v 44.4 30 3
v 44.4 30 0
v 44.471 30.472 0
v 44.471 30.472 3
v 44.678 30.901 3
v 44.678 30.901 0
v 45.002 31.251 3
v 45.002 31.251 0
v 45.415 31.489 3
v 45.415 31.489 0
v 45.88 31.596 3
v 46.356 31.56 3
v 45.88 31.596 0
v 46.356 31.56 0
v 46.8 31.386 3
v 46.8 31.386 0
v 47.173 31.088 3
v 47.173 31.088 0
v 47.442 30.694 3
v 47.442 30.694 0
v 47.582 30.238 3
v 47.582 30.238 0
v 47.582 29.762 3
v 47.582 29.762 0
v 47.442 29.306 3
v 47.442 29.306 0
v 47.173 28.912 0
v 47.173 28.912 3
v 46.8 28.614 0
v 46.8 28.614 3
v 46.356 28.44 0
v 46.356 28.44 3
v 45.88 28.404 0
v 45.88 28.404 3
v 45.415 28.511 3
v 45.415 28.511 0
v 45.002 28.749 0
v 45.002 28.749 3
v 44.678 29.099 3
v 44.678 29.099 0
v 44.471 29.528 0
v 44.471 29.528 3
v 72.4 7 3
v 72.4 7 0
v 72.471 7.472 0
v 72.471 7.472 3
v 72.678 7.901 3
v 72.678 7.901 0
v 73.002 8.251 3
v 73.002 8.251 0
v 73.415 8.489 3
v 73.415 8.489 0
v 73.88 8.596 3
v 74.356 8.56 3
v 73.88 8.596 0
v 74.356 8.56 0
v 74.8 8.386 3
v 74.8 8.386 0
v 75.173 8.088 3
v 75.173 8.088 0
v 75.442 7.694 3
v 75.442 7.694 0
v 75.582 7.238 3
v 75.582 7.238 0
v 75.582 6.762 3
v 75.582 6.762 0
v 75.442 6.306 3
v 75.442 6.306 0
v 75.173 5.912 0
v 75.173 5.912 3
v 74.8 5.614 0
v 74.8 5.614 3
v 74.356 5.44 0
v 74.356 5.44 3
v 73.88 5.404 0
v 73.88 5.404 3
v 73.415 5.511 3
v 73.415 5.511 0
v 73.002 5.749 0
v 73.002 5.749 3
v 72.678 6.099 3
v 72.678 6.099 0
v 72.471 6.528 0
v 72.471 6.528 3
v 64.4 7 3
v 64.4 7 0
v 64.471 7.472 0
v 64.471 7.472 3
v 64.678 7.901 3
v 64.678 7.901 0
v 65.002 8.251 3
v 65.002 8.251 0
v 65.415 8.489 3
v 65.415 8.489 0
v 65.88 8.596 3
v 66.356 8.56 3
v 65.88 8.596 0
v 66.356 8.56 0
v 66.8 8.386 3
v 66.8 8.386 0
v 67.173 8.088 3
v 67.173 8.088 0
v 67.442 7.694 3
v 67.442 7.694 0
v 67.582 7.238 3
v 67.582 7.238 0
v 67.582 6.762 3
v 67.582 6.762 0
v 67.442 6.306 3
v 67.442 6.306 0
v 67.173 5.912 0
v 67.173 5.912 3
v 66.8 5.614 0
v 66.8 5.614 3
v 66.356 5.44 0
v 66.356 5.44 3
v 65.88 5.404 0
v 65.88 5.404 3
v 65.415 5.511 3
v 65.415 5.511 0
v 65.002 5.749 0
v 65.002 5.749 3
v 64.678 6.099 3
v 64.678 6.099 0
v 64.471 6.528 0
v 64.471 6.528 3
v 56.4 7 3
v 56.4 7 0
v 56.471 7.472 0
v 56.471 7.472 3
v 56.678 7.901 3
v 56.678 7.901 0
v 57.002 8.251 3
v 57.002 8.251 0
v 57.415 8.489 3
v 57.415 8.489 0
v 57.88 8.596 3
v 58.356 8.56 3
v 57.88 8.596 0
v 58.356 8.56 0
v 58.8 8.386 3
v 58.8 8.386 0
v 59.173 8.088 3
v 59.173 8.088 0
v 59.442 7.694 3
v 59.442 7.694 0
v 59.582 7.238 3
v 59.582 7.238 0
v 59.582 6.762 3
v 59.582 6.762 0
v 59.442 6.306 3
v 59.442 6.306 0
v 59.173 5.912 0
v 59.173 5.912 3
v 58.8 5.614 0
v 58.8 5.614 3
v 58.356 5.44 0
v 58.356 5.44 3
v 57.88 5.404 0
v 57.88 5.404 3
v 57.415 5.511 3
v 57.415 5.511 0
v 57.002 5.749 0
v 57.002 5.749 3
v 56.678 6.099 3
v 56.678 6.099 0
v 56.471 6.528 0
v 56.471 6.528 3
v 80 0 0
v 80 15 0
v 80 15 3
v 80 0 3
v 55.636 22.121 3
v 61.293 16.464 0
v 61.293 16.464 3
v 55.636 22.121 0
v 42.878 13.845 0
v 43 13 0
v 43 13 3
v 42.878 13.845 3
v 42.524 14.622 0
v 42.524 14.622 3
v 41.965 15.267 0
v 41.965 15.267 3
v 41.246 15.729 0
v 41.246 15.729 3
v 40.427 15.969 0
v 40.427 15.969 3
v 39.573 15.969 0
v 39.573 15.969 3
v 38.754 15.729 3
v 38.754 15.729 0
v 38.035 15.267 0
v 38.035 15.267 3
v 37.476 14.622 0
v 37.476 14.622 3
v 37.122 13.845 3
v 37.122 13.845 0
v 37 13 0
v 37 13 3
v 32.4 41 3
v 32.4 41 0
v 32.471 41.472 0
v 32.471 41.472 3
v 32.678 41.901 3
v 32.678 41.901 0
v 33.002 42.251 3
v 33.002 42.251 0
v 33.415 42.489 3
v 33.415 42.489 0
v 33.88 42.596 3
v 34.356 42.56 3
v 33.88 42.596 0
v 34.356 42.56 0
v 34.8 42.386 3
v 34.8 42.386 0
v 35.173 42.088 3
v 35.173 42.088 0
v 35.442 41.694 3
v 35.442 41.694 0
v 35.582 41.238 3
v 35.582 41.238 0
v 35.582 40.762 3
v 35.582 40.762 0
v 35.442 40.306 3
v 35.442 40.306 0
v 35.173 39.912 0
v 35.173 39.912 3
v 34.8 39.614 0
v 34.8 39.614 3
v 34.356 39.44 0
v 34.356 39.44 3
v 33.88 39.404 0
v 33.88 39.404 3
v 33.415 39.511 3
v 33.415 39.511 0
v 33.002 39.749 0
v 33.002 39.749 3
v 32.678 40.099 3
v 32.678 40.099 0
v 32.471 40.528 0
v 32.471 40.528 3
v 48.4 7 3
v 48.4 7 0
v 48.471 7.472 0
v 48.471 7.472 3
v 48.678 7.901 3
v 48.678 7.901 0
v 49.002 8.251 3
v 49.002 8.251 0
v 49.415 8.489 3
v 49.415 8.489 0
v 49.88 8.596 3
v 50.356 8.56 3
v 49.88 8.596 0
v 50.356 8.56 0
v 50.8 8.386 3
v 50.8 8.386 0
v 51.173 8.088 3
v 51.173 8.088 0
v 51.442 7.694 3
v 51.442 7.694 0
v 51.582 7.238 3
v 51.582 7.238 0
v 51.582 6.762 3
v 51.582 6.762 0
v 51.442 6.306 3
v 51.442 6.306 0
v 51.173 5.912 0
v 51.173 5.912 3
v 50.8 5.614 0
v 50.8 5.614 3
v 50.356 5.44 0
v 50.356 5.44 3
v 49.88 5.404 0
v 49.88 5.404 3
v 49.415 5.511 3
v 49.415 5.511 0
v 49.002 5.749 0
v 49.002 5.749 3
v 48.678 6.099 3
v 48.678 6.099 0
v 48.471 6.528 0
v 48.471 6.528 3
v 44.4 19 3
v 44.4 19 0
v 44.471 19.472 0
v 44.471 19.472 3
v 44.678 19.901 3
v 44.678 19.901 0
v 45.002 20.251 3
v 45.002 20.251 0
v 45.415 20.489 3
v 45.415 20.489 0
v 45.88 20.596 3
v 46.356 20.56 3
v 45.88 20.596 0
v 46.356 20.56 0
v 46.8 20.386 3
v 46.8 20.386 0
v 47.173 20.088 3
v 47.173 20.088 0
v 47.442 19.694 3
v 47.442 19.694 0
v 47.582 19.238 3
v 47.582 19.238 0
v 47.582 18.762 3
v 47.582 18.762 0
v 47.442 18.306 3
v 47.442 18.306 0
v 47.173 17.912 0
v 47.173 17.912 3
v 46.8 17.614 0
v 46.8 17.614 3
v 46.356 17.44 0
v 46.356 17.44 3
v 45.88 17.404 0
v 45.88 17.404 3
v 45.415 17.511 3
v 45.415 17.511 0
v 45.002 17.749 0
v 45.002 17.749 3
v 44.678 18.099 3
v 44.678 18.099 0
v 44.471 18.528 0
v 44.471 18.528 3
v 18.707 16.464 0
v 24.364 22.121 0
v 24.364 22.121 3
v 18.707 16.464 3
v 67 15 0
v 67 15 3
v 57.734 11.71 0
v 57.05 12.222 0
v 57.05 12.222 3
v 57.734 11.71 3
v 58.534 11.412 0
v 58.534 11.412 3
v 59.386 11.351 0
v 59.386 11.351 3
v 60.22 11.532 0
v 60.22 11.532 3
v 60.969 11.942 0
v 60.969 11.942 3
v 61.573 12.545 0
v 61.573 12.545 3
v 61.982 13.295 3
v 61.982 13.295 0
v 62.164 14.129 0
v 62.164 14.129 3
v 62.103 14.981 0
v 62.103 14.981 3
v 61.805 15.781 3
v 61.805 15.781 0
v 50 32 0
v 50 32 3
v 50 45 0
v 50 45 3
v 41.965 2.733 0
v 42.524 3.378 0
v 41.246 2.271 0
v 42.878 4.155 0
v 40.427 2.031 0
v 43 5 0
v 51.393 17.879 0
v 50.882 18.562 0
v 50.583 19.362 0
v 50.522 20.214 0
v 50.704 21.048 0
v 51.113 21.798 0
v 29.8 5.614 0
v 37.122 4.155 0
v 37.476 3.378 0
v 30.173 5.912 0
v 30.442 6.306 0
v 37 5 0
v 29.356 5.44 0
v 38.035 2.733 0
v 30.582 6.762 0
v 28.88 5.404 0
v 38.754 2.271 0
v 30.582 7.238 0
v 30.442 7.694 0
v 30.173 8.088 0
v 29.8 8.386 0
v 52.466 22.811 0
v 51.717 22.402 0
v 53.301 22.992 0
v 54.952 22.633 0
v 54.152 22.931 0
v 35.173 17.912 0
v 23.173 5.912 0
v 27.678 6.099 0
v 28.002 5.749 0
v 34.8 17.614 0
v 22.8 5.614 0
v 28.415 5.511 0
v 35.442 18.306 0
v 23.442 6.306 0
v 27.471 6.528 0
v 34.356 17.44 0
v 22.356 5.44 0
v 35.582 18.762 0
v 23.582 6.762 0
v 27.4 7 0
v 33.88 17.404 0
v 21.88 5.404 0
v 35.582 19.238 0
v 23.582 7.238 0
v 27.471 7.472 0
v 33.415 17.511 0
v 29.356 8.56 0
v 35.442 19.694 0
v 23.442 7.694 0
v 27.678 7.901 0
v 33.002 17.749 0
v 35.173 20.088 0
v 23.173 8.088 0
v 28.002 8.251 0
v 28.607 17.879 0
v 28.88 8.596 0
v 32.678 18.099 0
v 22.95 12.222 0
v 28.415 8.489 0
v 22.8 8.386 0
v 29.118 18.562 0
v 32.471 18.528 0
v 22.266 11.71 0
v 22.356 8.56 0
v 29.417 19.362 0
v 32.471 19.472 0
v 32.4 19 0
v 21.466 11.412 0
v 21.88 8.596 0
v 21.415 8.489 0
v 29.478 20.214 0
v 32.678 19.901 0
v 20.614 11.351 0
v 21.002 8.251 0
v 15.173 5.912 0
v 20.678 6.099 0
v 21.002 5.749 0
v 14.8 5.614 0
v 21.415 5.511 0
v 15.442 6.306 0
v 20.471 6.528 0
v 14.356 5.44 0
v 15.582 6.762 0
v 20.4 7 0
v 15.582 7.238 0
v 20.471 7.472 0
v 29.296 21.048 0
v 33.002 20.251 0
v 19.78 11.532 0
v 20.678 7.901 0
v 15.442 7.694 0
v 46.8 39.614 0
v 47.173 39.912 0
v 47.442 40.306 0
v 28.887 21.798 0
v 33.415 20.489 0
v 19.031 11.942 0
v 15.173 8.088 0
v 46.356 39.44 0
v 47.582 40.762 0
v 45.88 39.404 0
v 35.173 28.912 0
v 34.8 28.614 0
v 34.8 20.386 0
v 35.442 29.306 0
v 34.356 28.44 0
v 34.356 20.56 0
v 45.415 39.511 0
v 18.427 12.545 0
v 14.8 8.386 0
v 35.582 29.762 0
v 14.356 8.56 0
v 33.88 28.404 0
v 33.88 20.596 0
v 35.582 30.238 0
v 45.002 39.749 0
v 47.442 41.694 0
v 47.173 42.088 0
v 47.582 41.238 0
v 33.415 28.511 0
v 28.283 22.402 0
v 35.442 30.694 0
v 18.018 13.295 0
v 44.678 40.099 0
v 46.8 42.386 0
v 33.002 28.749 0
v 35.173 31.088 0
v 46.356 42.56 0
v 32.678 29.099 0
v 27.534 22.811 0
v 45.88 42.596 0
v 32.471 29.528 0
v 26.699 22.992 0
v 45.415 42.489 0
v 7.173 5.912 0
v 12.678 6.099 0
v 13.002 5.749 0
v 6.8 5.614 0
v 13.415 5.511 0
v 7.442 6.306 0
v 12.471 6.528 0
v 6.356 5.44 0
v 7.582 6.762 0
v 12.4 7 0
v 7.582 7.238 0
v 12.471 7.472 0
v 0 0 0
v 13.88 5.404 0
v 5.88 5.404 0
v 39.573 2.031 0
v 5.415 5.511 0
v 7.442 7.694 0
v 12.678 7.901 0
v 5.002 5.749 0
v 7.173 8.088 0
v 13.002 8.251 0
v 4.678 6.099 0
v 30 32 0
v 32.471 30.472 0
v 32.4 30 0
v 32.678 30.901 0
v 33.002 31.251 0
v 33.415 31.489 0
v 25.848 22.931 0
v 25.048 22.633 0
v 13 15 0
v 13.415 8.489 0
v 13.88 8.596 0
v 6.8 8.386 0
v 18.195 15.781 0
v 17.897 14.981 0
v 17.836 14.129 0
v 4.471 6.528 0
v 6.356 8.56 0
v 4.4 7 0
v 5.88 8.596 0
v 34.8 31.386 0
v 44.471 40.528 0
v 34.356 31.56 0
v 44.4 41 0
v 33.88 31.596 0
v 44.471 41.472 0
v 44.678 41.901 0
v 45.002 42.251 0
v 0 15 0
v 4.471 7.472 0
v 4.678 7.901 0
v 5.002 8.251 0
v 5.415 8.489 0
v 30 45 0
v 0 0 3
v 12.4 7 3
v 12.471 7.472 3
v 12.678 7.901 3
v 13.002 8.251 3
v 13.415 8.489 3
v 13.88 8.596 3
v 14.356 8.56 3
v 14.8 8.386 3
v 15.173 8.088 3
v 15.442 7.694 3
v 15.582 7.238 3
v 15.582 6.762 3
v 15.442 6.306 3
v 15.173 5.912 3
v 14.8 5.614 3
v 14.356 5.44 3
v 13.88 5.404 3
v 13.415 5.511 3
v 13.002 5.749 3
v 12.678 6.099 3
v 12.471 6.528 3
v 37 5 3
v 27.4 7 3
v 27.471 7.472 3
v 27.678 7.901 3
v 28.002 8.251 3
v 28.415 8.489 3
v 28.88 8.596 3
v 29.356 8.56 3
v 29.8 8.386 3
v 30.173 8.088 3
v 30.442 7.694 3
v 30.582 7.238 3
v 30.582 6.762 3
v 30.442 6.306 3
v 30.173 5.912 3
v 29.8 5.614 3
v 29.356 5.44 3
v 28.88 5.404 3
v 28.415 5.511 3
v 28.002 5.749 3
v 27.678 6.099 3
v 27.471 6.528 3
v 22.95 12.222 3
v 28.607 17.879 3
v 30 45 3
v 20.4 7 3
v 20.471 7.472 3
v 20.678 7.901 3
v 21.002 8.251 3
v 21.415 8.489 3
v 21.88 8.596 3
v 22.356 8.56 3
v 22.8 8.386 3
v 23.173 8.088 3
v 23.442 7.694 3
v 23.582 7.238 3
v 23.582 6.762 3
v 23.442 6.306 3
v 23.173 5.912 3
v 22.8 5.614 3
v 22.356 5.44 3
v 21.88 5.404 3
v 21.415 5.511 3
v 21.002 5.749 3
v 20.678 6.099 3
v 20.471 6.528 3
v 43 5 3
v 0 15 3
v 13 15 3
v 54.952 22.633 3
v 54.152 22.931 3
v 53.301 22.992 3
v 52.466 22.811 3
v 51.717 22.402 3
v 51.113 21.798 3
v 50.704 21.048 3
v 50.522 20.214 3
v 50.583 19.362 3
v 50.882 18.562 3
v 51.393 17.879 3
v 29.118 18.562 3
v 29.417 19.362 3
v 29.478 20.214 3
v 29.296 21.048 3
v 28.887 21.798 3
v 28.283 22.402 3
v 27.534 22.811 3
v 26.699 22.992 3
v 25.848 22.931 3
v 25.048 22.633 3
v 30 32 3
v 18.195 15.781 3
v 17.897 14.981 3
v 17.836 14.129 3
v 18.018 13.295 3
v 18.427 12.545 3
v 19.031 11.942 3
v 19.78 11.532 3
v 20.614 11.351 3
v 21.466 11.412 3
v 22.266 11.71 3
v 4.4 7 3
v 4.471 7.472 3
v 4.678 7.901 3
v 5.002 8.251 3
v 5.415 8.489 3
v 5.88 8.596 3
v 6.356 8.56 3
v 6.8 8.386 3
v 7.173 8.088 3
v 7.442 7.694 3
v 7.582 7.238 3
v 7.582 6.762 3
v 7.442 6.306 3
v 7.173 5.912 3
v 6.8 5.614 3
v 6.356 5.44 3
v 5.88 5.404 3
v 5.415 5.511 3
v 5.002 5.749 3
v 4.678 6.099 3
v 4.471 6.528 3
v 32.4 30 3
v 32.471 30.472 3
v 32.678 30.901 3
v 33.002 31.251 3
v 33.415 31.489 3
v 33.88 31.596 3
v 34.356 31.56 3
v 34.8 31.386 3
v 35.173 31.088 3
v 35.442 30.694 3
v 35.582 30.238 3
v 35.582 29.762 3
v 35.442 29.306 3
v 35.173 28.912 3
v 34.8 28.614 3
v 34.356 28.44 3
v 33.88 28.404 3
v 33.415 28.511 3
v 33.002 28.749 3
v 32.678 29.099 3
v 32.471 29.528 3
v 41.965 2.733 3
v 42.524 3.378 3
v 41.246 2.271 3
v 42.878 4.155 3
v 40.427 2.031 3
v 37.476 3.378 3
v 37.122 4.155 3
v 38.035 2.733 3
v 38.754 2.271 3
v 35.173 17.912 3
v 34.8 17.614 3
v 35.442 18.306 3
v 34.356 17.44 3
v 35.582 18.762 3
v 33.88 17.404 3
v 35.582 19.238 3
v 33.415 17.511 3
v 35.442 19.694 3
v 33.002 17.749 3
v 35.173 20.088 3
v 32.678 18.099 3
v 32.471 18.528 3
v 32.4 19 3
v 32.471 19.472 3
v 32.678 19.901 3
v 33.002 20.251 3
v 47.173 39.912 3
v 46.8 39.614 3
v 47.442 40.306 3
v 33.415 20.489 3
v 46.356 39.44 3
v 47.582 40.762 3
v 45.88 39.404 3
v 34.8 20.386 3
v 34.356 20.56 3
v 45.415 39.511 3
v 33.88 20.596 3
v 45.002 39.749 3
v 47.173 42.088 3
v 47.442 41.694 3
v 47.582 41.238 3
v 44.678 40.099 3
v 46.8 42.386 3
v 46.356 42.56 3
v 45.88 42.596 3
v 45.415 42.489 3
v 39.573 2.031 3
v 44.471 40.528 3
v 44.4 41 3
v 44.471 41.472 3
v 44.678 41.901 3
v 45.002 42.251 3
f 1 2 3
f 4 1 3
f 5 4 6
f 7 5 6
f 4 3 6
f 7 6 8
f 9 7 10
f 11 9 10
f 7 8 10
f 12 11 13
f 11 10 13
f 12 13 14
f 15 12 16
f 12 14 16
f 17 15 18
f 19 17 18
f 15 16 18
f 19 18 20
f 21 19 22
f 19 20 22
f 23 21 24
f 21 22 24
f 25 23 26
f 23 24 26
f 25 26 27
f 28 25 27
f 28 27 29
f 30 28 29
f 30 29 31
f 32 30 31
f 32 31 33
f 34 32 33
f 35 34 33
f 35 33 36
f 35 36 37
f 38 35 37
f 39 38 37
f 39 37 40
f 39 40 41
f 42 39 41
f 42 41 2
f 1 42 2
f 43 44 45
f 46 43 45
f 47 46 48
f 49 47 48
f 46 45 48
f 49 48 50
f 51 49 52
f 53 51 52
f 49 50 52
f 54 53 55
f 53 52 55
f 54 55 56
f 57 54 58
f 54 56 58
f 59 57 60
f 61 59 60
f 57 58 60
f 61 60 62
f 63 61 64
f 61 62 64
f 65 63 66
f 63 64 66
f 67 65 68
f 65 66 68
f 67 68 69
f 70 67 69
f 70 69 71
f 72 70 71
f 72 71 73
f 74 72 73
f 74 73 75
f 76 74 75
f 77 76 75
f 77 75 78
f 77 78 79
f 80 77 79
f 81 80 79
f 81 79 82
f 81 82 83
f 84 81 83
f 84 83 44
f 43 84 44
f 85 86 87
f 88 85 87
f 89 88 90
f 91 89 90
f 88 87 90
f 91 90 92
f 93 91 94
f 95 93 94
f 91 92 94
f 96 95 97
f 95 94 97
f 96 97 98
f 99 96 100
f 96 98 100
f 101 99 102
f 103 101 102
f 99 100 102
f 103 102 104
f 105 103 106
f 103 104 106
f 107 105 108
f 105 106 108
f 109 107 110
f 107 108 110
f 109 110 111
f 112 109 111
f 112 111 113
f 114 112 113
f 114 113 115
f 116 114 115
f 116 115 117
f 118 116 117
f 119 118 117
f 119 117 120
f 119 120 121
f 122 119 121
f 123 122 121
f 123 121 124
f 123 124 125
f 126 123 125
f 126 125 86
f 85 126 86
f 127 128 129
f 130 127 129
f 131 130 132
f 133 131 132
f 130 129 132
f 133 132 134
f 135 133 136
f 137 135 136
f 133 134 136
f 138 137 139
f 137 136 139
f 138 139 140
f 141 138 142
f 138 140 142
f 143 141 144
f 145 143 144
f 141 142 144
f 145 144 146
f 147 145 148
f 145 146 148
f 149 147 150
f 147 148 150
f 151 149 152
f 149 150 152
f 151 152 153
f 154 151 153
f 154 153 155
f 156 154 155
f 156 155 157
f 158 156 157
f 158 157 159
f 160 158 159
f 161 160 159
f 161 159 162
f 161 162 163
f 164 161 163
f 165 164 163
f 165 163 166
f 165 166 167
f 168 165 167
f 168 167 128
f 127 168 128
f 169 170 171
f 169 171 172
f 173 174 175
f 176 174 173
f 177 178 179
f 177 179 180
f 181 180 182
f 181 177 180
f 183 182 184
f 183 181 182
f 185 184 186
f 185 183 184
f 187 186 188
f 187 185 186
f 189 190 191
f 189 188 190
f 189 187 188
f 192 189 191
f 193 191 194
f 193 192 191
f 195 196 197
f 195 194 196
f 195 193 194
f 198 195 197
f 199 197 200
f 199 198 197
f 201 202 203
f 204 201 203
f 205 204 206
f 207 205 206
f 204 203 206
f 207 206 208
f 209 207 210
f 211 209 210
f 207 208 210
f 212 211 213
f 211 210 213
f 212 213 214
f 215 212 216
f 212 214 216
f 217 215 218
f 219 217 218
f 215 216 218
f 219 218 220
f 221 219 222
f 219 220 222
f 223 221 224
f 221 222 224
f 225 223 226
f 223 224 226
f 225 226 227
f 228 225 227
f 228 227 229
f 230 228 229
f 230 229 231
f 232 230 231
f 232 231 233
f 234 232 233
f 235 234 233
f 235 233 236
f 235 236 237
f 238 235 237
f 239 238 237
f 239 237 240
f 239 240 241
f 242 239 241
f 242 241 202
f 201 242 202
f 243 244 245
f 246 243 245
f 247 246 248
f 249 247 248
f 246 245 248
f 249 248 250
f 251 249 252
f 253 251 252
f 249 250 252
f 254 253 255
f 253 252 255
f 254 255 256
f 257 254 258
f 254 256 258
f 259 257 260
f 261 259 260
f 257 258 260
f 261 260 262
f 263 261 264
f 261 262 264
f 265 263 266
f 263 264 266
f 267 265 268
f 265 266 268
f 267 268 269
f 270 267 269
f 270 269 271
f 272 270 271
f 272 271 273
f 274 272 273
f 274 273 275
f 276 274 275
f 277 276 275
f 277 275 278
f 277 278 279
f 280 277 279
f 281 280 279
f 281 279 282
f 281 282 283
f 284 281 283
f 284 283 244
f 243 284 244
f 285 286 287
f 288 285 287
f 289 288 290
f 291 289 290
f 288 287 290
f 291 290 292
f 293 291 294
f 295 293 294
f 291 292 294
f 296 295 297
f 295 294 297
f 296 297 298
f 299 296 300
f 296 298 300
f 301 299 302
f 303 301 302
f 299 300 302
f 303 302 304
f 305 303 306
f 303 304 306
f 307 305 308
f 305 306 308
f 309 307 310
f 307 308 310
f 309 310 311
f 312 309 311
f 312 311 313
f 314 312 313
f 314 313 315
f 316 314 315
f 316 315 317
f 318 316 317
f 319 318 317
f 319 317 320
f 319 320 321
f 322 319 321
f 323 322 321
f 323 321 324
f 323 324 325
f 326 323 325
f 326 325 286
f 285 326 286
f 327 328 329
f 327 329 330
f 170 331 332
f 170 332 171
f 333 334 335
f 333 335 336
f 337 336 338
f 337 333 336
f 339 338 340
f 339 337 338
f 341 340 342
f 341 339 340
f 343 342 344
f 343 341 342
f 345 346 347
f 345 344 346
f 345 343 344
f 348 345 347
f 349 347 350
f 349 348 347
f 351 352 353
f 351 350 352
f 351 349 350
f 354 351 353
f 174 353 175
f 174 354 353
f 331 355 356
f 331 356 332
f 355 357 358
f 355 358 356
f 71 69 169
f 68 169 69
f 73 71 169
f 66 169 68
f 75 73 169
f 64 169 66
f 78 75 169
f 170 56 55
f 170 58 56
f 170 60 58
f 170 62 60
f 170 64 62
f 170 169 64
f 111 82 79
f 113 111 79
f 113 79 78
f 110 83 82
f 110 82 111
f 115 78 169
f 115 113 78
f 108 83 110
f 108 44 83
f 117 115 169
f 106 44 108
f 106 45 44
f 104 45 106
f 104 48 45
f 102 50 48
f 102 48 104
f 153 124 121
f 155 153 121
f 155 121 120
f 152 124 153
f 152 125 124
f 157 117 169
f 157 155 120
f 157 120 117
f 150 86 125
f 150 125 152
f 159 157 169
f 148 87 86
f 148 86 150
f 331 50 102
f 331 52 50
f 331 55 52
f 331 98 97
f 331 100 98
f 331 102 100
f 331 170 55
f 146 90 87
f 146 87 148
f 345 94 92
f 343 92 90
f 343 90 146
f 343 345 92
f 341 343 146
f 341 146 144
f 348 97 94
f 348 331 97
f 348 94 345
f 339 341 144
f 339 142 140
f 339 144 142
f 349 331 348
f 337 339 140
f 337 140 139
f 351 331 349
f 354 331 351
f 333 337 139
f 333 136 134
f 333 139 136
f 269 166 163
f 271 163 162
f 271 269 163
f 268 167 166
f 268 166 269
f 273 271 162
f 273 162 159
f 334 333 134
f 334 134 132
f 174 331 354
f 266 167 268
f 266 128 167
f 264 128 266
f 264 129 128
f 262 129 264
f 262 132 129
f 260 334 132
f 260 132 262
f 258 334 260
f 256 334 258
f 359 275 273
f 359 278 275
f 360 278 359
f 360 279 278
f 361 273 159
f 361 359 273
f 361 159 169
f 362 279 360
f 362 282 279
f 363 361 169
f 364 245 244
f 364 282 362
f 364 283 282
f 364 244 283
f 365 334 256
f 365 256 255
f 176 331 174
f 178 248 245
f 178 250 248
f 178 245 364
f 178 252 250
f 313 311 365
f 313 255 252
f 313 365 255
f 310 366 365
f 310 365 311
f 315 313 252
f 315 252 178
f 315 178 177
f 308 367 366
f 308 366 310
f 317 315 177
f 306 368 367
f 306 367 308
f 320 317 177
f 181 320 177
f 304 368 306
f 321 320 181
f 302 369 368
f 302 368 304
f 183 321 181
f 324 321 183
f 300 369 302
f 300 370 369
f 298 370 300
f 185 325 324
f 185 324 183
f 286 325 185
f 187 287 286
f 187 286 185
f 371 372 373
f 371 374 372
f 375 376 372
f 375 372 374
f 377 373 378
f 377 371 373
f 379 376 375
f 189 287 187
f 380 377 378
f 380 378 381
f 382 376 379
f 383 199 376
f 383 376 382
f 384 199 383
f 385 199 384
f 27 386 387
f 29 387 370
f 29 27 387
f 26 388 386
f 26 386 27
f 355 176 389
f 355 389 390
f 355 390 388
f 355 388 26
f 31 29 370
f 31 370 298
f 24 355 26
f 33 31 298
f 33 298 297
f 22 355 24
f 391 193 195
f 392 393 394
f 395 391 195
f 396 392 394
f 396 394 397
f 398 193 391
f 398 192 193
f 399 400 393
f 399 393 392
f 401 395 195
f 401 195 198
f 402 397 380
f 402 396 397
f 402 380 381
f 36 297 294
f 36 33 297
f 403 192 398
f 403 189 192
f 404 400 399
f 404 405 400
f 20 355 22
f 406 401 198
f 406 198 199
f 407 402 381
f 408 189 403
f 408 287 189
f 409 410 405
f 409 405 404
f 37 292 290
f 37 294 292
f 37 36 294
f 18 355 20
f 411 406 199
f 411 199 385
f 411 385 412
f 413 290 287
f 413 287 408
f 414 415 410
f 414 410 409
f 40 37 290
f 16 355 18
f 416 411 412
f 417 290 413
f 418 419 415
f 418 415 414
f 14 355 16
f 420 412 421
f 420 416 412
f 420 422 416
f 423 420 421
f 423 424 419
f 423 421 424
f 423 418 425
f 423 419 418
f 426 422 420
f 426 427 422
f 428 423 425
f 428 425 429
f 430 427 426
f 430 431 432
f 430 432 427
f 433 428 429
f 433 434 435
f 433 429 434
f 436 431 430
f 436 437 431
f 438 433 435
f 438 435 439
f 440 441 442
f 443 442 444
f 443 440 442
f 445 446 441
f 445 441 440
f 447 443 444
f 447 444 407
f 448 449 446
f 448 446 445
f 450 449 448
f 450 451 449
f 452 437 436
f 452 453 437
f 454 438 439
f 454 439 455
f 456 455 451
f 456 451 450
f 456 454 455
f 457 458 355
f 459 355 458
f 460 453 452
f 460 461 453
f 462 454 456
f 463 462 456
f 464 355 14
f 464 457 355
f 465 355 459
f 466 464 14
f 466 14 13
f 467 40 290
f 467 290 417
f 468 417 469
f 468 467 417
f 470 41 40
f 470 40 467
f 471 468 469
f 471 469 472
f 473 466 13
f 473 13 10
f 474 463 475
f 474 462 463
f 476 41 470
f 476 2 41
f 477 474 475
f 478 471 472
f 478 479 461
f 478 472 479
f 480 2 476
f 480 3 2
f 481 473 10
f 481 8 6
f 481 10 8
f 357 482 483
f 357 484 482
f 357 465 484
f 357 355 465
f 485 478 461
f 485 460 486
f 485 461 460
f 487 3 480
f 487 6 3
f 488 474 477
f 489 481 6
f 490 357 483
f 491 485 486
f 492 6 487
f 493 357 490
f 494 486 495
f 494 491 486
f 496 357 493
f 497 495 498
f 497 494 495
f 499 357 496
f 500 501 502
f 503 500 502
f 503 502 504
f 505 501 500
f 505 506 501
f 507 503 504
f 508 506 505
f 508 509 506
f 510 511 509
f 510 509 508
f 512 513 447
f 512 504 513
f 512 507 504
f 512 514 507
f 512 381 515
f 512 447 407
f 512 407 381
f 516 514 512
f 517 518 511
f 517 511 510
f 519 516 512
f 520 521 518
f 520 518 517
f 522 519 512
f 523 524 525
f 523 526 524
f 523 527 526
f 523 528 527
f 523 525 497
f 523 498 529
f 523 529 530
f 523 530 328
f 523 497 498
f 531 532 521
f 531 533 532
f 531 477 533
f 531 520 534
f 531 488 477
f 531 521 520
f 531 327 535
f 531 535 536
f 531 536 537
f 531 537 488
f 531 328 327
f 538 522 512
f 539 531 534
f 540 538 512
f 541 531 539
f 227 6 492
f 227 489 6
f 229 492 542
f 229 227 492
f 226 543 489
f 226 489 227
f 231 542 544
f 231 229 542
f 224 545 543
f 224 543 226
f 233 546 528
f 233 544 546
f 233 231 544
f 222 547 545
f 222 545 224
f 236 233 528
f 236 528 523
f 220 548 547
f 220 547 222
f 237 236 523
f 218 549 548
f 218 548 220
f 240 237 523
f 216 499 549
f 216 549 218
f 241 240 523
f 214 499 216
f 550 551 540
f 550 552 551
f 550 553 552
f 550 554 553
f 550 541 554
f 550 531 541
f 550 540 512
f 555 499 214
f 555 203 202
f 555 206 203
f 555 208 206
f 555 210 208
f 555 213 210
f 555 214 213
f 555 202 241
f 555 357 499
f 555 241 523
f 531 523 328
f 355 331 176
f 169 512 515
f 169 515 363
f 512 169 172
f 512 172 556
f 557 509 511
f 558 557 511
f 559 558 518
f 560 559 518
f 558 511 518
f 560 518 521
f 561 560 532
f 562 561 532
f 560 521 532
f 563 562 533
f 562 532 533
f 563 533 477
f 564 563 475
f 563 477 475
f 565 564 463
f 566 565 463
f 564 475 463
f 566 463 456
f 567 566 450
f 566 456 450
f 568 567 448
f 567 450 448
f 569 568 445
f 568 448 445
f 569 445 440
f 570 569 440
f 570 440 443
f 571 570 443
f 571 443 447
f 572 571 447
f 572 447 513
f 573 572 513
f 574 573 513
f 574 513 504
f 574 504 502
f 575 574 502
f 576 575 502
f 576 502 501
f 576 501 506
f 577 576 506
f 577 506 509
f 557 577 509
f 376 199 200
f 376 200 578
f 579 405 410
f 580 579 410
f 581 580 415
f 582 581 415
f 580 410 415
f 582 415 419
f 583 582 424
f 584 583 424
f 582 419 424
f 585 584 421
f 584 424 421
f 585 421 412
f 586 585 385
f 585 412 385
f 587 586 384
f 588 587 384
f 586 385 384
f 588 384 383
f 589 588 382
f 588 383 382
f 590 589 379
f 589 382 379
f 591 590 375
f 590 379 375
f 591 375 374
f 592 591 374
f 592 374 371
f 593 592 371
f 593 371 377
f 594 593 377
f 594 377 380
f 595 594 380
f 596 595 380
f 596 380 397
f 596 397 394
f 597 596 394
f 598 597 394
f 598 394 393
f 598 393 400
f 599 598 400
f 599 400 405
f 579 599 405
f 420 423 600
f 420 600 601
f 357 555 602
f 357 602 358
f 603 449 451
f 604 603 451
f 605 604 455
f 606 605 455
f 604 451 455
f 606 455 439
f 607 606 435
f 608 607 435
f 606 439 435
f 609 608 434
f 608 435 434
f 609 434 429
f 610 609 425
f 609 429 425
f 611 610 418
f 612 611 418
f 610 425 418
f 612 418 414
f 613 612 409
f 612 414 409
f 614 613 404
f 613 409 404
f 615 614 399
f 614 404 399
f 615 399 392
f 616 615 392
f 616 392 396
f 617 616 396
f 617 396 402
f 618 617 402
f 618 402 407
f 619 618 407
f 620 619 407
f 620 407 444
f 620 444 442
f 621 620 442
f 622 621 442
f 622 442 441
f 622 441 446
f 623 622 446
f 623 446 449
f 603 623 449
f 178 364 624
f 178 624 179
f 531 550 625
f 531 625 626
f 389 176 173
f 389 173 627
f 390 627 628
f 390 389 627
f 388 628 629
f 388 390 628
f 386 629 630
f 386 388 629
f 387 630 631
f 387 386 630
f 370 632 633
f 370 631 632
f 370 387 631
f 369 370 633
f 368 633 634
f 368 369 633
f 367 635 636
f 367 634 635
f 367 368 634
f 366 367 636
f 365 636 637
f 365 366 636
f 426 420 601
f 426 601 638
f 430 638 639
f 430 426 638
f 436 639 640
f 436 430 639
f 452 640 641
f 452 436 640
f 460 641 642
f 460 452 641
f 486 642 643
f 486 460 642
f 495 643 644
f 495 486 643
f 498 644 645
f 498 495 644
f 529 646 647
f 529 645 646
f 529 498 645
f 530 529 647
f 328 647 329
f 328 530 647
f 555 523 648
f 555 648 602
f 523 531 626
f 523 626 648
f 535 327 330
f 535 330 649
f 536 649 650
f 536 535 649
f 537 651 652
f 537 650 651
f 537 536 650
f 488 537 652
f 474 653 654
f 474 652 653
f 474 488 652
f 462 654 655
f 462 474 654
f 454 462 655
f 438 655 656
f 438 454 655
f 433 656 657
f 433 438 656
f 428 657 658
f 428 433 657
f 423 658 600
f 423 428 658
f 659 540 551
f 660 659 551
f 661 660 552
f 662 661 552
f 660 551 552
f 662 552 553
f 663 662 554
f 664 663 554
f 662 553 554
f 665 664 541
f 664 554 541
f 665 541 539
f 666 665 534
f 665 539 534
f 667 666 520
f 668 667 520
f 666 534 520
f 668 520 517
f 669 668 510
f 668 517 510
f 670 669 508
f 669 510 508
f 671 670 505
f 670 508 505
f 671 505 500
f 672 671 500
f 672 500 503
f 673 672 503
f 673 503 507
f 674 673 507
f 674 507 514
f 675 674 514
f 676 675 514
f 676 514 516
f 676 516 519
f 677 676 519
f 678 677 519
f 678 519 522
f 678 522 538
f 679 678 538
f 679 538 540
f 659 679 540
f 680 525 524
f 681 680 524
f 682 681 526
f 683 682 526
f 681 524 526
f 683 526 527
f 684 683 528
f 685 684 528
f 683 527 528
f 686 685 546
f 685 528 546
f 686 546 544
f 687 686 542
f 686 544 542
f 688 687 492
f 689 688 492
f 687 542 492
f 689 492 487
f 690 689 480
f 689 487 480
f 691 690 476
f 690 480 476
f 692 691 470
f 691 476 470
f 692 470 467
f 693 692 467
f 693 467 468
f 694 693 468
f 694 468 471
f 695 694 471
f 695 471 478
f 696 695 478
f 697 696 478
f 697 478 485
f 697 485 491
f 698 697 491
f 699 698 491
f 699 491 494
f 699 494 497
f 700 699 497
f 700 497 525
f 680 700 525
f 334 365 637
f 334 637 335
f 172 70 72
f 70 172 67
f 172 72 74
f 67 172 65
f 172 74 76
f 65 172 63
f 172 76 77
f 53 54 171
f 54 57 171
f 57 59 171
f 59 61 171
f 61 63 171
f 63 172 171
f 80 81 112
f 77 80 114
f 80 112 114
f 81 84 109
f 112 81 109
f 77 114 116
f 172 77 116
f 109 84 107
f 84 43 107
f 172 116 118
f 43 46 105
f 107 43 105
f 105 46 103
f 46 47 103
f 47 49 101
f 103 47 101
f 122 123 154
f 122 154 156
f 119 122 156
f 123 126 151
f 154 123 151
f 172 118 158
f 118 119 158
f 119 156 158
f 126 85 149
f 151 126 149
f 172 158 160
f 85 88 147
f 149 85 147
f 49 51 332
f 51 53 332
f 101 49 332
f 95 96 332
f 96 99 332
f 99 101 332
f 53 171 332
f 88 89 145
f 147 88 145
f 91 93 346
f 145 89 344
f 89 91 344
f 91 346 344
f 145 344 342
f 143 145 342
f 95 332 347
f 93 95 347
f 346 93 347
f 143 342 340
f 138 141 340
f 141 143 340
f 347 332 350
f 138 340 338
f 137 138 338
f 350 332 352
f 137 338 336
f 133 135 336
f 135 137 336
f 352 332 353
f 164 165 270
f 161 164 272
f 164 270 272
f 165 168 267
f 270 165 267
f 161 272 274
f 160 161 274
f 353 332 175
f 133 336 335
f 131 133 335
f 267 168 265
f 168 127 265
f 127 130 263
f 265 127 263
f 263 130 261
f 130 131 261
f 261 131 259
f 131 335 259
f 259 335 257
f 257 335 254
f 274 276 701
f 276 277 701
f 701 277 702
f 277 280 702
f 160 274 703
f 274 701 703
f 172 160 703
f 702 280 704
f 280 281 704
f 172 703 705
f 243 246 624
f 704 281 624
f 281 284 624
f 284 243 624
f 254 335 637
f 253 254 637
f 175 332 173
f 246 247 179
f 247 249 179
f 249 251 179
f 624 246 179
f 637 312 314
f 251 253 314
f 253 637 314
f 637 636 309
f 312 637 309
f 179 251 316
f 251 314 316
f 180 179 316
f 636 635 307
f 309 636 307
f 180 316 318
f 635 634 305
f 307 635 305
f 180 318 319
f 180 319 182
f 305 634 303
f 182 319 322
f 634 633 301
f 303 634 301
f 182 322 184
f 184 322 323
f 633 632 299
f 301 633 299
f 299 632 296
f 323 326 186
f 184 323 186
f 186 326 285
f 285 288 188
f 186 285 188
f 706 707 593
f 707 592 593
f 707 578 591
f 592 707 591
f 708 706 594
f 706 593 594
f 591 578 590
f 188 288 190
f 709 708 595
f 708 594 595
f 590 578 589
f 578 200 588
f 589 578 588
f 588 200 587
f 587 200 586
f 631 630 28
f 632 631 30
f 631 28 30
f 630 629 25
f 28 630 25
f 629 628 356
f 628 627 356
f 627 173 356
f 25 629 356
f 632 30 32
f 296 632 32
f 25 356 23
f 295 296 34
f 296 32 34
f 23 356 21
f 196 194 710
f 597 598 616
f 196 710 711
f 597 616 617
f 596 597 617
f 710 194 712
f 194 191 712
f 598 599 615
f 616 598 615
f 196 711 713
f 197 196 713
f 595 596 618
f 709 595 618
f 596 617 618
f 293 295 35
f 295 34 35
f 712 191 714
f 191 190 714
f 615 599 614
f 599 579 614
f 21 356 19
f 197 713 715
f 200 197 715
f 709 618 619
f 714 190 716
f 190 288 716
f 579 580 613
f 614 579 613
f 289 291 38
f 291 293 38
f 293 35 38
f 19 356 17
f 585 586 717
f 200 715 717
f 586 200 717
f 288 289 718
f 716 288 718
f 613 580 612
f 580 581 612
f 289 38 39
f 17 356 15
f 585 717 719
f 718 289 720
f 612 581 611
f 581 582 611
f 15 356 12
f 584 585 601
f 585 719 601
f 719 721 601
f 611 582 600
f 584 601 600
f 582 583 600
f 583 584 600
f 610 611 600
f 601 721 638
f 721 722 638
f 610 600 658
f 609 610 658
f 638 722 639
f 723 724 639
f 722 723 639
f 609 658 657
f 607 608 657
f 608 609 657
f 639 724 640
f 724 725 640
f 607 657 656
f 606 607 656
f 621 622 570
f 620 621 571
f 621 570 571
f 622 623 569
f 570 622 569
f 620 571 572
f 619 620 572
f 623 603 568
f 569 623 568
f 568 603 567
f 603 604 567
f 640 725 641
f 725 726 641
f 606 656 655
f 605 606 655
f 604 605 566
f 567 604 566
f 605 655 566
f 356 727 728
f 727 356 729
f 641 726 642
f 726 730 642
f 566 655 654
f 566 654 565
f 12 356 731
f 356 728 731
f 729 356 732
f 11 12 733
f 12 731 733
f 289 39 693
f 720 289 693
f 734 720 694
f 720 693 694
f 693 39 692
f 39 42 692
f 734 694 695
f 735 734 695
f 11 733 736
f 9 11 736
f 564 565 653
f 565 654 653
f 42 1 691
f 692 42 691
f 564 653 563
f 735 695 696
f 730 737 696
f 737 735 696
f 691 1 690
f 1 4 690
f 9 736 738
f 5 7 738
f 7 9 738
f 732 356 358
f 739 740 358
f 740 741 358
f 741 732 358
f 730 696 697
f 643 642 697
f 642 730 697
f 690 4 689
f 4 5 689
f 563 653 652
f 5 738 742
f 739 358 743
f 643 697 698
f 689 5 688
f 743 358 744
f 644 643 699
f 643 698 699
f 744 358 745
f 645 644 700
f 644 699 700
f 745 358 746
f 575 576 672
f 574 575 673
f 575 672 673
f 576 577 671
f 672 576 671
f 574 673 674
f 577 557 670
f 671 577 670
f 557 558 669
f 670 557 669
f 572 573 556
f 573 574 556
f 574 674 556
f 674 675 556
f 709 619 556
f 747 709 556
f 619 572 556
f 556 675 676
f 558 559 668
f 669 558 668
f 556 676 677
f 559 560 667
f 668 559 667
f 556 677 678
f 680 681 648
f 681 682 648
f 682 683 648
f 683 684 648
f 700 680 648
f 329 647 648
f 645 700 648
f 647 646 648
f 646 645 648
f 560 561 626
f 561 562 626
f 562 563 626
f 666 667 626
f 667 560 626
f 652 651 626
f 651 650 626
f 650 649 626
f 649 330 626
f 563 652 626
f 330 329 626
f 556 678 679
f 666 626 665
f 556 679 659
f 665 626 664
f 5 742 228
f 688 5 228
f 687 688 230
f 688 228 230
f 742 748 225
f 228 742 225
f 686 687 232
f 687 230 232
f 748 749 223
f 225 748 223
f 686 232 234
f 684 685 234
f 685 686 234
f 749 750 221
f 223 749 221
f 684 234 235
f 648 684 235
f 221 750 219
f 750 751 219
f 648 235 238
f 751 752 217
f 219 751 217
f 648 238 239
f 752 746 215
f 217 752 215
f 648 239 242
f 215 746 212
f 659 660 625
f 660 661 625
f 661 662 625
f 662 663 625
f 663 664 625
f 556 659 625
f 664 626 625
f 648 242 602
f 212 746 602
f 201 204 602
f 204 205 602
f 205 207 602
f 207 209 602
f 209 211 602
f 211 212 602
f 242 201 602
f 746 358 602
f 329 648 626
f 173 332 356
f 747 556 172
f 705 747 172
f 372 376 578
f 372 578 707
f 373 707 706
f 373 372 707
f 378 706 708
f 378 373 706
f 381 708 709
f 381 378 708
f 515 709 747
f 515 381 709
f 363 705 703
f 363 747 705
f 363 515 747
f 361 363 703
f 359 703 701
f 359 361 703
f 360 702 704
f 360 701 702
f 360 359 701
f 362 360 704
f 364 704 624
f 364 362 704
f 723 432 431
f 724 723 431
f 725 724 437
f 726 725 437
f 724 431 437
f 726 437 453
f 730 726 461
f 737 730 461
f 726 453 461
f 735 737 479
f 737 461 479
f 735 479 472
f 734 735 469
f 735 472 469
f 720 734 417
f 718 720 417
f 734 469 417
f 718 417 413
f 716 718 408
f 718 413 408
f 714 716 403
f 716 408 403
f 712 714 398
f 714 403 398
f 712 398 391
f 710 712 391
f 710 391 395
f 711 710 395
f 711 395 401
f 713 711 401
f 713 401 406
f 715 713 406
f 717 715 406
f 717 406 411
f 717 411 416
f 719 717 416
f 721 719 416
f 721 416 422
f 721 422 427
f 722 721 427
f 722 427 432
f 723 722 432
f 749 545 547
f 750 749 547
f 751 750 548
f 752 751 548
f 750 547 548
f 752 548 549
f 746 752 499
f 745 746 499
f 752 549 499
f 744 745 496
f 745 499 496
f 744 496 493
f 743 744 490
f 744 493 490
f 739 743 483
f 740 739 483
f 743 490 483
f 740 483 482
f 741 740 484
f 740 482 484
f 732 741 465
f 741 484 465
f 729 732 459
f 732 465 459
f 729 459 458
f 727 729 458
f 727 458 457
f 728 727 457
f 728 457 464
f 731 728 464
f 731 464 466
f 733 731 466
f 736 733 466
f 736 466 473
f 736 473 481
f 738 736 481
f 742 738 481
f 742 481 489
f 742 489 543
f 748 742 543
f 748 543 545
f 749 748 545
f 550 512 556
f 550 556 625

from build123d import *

# Parameters (mm, degrees)
EXTRUDE_1_DEPTH     = 3
SKETCH_3_R          = 1.6
CUT_EXTRUDE_1_DEPTH = 92.836811791


with BuildPart() as part:
    # 草图1 → 凸台-拉伸1 (new body)
    with BuildSketch(Plane.XY):
        Polygon((0, 0), (0, 15), (13, 15), (30, 32), (30, 45), (50, 45), (50, 32), (67, 15), (80, 15), (80, 0), align=None)
    extrude(amount=EXTRUDE_1_DEPTH)

    # 草图3 → 切除-拉伸1 (cut, through all)
    with BuildSketch(Plane(origin=(0, 0, 0), x_dir=(-1, 0, 0), z_dir=(0, 0, -1))):
        with Locations((-46, 41)):
            Circle(SKETCH_3_R)
        with Locations((-34, 41)):
            Circle(SKETCH_3_R)
        with Locations((-46, 19)):
            Circle(SKETCH_3_R)
        with Locations((-34, 19)):
            Circle(SKETCH_3_R)
        with Locations((-34, 30)):
            Circle(SKETCH_3_R)
        with Locations((-46, 30)):
            Circle(SKETCH_3_R)
        with Locations((-74, 7)):
            Circle(SKETCH_3_R)
        with Locations((-66, 7)):
            Circle(SKETCH_3_R)
        with Locations((-58, 7)):
            Circle(SKETCH_3_R)
        with Locations((-50, 7)):
            Circle(SKETCH_3_R)
        with Locations((-6, 7)):
            Circle(SKETCH_3_R)
        with Locations((-14, 7)):
            Circle(SKETCH_3_R)
        with Locations((-22, 7)):
            Circle(SKETCH_3_R)
        with Locations((-29, 7)):
            Circle(SKETCH_3_R)
        with BuildLine():
            Line((-61.292893219, 16.464466094), (-55.636038969, 22.121320344))
            ThreePointArc((-55.636038969, 22.121320344), (-51.393398282, 22.121320344), (-51.393398282, 17.878679656))
            Line((-51.393398282, 17.878679656), (-57.050252532, 12.221825407))
            ThreePointArc((-57.050252532, 12.221825407), (-61.292893219, 12.221825407), (-61.292893219, 16.464466094))
        make_face()
        with BuildLine():
            Line((-22.949747468, 12.221825407), (-28.606601718, 17.878679656))
            ThreePointArc((-28.606601718, 17.878679656), (-28.606601718, 22.121320344), (-24.363961031, 22.121320344))
            Line((-24.363961031, 22.121320344), (-18.707106781, 16.464466094))
            ThreePointArc((-18.707106781, 16.464466094), (-18.707106781, 12.221825407), (-22.949747468, 12.221825407))
        make_face()
        with BuildLine():
            Line((-43, 5), (-43, 13))
            ThreePointArc((-43, 13), (-40, 16), (-37, 13))
            Line((-37, 13), (-37, 5))
            ThreePointArc((-37, 5), (-40, 2), (-43, 5))
        make_face()
    extrude(amount=-CUT_EXTRUDE_1_DEPTH, mode=Mode.SUBTRACT)


solid = part.part
